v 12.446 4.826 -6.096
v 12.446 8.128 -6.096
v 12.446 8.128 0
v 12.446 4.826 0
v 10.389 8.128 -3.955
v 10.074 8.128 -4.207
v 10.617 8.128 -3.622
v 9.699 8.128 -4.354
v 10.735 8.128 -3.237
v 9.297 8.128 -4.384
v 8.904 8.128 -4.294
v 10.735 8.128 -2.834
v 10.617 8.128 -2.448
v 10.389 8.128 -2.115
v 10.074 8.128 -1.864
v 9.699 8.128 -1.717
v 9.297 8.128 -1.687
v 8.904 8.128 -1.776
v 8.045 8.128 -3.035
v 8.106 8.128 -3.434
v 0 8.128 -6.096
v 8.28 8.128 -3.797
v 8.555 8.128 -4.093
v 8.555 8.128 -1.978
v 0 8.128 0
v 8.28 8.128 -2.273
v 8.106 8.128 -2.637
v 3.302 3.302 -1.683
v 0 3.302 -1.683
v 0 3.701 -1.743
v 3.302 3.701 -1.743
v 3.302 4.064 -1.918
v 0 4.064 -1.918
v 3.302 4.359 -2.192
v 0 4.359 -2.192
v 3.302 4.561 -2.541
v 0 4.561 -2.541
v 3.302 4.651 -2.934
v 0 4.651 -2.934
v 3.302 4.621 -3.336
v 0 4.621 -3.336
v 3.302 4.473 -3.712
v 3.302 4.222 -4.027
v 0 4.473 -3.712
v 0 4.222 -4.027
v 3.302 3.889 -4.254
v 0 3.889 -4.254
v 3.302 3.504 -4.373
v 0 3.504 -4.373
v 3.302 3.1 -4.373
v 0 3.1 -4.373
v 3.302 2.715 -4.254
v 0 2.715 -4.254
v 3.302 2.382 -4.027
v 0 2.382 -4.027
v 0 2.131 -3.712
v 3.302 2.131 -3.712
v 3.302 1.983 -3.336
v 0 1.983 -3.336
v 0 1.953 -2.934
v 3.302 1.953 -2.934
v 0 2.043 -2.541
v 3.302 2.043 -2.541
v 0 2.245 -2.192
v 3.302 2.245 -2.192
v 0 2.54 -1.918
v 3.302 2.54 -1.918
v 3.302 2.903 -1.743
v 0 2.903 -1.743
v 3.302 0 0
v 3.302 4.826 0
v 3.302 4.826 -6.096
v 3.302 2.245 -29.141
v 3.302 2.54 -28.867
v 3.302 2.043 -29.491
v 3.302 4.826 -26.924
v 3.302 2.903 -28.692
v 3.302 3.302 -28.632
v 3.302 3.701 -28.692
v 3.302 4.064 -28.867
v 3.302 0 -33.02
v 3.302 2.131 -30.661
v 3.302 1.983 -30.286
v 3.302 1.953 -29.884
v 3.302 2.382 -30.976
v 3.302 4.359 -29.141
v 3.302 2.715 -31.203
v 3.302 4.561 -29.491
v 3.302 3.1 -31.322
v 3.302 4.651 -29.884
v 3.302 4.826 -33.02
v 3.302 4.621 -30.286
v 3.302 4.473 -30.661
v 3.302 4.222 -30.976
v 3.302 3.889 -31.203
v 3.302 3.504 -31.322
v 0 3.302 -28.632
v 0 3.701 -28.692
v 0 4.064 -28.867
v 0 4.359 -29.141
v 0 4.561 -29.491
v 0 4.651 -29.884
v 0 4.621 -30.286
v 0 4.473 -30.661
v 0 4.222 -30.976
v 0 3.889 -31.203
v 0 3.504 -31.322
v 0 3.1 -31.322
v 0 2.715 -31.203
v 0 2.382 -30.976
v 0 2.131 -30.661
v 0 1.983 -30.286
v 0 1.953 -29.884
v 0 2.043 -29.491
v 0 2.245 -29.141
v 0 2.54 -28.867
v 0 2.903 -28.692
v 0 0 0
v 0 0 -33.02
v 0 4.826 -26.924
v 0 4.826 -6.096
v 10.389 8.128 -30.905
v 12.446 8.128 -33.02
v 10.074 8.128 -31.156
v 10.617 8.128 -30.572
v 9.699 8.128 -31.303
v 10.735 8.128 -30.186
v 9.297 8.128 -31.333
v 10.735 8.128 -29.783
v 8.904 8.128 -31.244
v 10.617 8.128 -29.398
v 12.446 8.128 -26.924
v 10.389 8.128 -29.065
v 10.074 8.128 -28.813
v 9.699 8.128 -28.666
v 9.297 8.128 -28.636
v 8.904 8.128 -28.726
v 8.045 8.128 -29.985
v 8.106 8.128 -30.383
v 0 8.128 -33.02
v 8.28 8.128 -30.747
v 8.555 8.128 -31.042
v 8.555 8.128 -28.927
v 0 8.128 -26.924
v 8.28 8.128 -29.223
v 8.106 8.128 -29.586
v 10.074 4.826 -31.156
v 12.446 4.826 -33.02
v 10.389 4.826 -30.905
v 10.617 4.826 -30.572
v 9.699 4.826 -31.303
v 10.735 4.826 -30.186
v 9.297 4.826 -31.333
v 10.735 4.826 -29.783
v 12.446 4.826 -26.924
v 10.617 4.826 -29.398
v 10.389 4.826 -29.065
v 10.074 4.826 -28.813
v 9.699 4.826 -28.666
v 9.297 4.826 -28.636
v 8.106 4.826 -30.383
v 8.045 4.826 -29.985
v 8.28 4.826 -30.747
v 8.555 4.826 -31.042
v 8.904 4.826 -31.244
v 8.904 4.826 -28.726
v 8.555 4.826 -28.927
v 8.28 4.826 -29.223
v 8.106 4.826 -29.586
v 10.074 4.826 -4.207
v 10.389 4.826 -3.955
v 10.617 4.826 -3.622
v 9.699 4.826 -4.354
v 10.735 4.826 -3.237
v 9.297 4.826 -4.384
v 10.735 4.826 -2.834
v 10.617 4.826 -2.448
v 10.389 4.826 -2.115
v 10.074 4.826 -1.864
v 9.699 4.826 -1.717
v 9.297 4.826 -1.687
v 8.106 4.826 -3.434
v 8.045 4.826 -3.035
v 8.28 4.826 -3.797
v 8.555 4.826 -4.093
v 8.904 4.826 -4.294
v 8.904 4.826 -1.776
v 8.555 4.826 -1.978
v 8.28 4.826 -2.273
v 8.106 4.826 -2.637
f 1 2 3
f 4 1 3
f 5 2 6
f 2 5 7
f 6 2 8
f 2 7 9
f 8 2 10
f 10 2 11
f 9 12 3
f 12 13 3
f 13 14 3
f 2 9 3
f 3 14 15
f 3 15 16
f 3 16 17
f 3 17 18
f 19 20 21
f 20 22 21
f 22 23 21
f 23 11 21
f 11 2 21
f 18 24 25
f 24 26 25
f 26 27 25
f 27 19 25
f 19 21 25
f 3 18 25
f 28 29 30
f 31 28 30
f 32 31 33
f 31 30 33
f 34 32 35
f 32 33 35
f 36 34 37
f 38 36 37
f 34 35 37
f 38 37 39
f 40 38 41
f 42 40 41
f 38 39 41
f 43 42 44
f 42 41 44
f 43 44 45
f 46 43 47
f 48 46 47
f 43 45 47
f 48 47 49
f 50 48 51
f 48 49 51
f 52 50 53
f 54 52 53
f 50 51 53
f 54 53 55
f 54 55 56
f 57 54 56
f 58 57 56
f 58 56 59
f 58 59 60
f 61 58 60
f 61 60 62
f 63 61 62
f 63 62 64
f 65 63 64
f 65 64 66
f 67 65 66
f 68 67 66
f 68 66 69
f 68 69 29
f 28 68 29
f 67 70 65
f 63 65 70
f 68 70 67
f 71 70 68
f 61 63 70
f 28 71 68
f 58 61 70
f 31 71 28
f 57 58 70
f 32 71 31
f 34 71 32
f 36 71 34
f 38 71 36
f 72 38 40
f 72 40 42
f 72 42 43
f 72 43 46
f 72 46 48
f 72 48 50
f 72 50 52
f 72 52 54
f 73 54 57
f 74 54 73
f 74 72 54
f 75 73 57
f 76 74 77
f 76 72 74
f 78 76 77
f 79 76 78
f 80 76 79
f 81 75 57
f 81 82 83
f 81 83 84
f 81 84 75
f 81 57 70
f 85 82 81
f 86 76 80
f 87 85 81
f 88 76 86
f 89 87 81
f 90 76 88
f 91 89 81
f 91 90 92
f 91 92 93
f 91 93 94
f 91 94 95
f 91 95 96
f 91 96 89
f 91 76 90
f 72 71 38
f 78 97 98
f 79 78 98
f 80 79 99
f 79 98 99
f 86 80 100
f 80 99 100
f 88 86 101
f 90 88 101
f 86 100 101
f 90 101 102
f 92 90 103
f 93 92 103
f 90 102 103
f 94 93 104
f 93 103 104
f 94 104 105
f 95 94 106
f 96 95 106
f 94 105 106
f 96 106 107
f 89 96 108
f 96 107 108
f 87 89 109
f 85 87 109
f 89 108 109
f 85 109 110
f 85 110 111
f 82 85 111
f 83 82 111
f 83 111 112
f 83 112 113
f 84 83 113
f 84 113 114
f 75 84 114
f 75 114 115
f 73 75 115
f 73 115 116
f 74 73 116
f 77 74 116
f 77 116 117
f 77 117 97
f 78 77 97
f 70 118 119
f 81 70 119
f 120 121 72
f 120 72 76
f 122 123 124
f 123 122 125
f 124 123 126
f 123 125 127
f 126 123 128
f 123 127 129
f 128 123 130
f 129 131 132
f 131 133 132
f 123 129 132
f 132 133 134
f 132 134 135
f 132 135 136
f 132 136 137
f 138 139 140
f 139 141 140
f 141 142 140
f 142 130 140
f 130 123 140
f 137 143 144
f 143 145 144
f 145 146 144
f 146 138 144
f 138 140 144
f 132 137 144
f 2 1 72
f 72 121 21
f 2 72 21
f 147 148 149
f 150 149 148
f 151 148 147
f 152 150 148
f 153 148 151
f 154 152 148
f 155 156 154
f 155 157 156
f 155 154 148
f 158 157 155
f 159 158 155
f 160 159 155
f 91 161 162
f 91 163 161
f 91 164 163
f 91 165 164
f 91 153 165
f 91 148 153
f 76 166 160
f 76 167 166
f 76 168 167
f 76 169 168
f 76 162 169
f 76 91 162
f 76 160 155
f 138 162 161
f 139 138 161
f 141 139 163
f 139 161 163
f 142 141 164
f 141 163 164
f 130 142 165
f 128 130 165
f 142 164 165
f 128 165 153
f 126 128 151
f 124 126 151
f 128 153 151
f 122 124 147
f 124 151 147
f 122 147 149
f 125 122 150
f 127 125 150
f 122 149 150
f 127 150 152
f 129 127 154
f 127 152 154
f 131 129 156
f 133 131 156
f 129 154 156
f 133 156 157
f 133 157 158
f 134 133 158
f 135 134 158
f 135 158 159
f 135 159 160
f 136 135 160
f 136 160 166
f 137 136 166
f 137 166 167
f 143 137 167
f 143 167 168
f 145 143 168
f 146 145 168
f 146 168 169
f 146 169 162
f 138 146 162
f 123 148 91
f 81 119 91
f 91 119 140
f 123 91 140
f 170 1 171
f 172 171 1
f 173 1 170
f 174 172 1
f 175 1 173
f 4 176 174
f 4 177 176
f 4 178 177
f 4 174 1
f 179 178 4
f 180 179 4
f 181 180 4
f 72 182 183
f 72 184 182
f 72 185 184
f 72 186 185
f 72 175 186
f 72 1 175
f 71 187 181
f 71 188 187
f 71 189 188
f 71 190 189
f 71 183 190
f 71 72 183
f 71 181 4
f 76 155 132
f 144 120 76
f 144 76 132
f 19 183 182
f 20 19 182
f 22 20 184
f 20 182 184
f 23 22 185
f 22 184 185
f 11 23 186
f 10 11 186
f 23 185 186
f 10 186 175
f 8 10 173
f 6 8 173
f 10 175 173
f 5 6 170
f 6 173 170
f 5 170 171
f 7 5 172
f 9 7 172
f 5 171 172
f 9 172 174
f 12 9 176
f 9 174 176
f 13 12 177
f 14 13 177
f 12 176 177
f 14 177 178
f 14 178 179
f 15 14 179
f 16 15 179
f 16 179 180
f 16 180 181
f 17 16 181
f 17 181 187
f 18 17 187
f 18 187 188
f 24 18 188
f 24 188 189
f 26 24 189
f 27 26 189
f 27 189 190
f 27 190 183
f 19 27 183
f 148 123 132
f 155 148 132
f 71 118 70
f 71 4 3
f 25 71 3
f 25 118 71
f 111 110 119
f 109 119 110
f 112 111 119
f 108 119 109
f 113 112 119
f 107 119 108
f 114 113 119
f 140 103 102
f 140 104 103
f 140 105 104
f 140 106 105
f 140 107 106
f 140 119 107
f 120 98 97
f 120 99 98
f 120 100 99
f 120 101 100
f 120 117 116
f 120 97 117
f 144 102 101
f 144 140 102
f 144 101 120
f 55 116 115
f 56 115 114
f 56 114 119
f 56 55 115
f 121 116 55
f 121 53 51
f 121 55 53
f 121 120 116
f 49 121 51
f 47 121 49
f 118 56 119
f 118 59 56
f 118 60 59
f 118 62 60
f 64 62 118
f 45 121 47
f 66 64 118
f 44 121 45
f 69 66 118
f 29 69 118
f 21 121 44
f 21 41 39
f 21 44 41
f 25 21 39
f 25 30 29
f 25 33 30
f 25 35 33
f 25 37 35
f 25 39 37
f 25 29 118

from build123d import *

# Parameters (mm, degrees)
SKETCH1_W             = 33.02
SKETCH1_H             = 4.826
BOSS_EXTRUDE1_DEPTH   = 3.302
SKETCH2_W             = 6.096
SKETCH2_H             = 3.302
BOSS_EXTRUDE2_DEPTH   = 12.446
F_6_32_TAPPED_HOLE1_D = 2.7051
F_6_32_TAPPED_HOLE2_D = 2.7051


with BuildPart() as part:
    # Sketch1 → Boss-Extrude1 (new body)
    with BuildSketch(Plane(origin=(0, 0, 0), x_dir=(0, 0, -1), z_dir=(1, 0, 0))):
        with Locations((16.51, 2.413)):
            Rectangle(SKETCH1_W, SKETCH1_H)
    extrude(amount=BOSS_EXTRUDE1_DEPTH)

    # Sketch2 → Boss-Extrude2 (add)
    with BuildSketch(Plane.ZY):
        with Locations((-29.972, 6.477)):
            Rectangle(SKETCH2_W, SKETCH2_H)
        with Locations((-3.048, 6.477)):
            Rectangle(SKETCH2_W, SKETCH2_H)
    extrude(amount=-BOSS_EXTRUDE2_DEPTH)

    # #6-32 Tapped Hole1 (through all)
    with Locations(Plane(origin=(3.302, 0, 0), x_dir=(0, 0, -1), z_dir=(1, 0, 0))):
        with Locations((3.0353, 3.302), (29.9847, 3.302)):
            Hole(F_6_32_TAPPED_HOLE1_D / 2)

    # #6-32 Tapped Hole2 (through all)
    with Locations(Plane(origin=(0, 8.128, 0), x_dir=(1, 0, 0), z_dir=(0, 1, 0))):
        with Locations((9.398, 3.0353), (9.398, 29.9847)):
            Hole(F_6_32_TAPPED_HOLE2_D / 2)


solid = part.part
